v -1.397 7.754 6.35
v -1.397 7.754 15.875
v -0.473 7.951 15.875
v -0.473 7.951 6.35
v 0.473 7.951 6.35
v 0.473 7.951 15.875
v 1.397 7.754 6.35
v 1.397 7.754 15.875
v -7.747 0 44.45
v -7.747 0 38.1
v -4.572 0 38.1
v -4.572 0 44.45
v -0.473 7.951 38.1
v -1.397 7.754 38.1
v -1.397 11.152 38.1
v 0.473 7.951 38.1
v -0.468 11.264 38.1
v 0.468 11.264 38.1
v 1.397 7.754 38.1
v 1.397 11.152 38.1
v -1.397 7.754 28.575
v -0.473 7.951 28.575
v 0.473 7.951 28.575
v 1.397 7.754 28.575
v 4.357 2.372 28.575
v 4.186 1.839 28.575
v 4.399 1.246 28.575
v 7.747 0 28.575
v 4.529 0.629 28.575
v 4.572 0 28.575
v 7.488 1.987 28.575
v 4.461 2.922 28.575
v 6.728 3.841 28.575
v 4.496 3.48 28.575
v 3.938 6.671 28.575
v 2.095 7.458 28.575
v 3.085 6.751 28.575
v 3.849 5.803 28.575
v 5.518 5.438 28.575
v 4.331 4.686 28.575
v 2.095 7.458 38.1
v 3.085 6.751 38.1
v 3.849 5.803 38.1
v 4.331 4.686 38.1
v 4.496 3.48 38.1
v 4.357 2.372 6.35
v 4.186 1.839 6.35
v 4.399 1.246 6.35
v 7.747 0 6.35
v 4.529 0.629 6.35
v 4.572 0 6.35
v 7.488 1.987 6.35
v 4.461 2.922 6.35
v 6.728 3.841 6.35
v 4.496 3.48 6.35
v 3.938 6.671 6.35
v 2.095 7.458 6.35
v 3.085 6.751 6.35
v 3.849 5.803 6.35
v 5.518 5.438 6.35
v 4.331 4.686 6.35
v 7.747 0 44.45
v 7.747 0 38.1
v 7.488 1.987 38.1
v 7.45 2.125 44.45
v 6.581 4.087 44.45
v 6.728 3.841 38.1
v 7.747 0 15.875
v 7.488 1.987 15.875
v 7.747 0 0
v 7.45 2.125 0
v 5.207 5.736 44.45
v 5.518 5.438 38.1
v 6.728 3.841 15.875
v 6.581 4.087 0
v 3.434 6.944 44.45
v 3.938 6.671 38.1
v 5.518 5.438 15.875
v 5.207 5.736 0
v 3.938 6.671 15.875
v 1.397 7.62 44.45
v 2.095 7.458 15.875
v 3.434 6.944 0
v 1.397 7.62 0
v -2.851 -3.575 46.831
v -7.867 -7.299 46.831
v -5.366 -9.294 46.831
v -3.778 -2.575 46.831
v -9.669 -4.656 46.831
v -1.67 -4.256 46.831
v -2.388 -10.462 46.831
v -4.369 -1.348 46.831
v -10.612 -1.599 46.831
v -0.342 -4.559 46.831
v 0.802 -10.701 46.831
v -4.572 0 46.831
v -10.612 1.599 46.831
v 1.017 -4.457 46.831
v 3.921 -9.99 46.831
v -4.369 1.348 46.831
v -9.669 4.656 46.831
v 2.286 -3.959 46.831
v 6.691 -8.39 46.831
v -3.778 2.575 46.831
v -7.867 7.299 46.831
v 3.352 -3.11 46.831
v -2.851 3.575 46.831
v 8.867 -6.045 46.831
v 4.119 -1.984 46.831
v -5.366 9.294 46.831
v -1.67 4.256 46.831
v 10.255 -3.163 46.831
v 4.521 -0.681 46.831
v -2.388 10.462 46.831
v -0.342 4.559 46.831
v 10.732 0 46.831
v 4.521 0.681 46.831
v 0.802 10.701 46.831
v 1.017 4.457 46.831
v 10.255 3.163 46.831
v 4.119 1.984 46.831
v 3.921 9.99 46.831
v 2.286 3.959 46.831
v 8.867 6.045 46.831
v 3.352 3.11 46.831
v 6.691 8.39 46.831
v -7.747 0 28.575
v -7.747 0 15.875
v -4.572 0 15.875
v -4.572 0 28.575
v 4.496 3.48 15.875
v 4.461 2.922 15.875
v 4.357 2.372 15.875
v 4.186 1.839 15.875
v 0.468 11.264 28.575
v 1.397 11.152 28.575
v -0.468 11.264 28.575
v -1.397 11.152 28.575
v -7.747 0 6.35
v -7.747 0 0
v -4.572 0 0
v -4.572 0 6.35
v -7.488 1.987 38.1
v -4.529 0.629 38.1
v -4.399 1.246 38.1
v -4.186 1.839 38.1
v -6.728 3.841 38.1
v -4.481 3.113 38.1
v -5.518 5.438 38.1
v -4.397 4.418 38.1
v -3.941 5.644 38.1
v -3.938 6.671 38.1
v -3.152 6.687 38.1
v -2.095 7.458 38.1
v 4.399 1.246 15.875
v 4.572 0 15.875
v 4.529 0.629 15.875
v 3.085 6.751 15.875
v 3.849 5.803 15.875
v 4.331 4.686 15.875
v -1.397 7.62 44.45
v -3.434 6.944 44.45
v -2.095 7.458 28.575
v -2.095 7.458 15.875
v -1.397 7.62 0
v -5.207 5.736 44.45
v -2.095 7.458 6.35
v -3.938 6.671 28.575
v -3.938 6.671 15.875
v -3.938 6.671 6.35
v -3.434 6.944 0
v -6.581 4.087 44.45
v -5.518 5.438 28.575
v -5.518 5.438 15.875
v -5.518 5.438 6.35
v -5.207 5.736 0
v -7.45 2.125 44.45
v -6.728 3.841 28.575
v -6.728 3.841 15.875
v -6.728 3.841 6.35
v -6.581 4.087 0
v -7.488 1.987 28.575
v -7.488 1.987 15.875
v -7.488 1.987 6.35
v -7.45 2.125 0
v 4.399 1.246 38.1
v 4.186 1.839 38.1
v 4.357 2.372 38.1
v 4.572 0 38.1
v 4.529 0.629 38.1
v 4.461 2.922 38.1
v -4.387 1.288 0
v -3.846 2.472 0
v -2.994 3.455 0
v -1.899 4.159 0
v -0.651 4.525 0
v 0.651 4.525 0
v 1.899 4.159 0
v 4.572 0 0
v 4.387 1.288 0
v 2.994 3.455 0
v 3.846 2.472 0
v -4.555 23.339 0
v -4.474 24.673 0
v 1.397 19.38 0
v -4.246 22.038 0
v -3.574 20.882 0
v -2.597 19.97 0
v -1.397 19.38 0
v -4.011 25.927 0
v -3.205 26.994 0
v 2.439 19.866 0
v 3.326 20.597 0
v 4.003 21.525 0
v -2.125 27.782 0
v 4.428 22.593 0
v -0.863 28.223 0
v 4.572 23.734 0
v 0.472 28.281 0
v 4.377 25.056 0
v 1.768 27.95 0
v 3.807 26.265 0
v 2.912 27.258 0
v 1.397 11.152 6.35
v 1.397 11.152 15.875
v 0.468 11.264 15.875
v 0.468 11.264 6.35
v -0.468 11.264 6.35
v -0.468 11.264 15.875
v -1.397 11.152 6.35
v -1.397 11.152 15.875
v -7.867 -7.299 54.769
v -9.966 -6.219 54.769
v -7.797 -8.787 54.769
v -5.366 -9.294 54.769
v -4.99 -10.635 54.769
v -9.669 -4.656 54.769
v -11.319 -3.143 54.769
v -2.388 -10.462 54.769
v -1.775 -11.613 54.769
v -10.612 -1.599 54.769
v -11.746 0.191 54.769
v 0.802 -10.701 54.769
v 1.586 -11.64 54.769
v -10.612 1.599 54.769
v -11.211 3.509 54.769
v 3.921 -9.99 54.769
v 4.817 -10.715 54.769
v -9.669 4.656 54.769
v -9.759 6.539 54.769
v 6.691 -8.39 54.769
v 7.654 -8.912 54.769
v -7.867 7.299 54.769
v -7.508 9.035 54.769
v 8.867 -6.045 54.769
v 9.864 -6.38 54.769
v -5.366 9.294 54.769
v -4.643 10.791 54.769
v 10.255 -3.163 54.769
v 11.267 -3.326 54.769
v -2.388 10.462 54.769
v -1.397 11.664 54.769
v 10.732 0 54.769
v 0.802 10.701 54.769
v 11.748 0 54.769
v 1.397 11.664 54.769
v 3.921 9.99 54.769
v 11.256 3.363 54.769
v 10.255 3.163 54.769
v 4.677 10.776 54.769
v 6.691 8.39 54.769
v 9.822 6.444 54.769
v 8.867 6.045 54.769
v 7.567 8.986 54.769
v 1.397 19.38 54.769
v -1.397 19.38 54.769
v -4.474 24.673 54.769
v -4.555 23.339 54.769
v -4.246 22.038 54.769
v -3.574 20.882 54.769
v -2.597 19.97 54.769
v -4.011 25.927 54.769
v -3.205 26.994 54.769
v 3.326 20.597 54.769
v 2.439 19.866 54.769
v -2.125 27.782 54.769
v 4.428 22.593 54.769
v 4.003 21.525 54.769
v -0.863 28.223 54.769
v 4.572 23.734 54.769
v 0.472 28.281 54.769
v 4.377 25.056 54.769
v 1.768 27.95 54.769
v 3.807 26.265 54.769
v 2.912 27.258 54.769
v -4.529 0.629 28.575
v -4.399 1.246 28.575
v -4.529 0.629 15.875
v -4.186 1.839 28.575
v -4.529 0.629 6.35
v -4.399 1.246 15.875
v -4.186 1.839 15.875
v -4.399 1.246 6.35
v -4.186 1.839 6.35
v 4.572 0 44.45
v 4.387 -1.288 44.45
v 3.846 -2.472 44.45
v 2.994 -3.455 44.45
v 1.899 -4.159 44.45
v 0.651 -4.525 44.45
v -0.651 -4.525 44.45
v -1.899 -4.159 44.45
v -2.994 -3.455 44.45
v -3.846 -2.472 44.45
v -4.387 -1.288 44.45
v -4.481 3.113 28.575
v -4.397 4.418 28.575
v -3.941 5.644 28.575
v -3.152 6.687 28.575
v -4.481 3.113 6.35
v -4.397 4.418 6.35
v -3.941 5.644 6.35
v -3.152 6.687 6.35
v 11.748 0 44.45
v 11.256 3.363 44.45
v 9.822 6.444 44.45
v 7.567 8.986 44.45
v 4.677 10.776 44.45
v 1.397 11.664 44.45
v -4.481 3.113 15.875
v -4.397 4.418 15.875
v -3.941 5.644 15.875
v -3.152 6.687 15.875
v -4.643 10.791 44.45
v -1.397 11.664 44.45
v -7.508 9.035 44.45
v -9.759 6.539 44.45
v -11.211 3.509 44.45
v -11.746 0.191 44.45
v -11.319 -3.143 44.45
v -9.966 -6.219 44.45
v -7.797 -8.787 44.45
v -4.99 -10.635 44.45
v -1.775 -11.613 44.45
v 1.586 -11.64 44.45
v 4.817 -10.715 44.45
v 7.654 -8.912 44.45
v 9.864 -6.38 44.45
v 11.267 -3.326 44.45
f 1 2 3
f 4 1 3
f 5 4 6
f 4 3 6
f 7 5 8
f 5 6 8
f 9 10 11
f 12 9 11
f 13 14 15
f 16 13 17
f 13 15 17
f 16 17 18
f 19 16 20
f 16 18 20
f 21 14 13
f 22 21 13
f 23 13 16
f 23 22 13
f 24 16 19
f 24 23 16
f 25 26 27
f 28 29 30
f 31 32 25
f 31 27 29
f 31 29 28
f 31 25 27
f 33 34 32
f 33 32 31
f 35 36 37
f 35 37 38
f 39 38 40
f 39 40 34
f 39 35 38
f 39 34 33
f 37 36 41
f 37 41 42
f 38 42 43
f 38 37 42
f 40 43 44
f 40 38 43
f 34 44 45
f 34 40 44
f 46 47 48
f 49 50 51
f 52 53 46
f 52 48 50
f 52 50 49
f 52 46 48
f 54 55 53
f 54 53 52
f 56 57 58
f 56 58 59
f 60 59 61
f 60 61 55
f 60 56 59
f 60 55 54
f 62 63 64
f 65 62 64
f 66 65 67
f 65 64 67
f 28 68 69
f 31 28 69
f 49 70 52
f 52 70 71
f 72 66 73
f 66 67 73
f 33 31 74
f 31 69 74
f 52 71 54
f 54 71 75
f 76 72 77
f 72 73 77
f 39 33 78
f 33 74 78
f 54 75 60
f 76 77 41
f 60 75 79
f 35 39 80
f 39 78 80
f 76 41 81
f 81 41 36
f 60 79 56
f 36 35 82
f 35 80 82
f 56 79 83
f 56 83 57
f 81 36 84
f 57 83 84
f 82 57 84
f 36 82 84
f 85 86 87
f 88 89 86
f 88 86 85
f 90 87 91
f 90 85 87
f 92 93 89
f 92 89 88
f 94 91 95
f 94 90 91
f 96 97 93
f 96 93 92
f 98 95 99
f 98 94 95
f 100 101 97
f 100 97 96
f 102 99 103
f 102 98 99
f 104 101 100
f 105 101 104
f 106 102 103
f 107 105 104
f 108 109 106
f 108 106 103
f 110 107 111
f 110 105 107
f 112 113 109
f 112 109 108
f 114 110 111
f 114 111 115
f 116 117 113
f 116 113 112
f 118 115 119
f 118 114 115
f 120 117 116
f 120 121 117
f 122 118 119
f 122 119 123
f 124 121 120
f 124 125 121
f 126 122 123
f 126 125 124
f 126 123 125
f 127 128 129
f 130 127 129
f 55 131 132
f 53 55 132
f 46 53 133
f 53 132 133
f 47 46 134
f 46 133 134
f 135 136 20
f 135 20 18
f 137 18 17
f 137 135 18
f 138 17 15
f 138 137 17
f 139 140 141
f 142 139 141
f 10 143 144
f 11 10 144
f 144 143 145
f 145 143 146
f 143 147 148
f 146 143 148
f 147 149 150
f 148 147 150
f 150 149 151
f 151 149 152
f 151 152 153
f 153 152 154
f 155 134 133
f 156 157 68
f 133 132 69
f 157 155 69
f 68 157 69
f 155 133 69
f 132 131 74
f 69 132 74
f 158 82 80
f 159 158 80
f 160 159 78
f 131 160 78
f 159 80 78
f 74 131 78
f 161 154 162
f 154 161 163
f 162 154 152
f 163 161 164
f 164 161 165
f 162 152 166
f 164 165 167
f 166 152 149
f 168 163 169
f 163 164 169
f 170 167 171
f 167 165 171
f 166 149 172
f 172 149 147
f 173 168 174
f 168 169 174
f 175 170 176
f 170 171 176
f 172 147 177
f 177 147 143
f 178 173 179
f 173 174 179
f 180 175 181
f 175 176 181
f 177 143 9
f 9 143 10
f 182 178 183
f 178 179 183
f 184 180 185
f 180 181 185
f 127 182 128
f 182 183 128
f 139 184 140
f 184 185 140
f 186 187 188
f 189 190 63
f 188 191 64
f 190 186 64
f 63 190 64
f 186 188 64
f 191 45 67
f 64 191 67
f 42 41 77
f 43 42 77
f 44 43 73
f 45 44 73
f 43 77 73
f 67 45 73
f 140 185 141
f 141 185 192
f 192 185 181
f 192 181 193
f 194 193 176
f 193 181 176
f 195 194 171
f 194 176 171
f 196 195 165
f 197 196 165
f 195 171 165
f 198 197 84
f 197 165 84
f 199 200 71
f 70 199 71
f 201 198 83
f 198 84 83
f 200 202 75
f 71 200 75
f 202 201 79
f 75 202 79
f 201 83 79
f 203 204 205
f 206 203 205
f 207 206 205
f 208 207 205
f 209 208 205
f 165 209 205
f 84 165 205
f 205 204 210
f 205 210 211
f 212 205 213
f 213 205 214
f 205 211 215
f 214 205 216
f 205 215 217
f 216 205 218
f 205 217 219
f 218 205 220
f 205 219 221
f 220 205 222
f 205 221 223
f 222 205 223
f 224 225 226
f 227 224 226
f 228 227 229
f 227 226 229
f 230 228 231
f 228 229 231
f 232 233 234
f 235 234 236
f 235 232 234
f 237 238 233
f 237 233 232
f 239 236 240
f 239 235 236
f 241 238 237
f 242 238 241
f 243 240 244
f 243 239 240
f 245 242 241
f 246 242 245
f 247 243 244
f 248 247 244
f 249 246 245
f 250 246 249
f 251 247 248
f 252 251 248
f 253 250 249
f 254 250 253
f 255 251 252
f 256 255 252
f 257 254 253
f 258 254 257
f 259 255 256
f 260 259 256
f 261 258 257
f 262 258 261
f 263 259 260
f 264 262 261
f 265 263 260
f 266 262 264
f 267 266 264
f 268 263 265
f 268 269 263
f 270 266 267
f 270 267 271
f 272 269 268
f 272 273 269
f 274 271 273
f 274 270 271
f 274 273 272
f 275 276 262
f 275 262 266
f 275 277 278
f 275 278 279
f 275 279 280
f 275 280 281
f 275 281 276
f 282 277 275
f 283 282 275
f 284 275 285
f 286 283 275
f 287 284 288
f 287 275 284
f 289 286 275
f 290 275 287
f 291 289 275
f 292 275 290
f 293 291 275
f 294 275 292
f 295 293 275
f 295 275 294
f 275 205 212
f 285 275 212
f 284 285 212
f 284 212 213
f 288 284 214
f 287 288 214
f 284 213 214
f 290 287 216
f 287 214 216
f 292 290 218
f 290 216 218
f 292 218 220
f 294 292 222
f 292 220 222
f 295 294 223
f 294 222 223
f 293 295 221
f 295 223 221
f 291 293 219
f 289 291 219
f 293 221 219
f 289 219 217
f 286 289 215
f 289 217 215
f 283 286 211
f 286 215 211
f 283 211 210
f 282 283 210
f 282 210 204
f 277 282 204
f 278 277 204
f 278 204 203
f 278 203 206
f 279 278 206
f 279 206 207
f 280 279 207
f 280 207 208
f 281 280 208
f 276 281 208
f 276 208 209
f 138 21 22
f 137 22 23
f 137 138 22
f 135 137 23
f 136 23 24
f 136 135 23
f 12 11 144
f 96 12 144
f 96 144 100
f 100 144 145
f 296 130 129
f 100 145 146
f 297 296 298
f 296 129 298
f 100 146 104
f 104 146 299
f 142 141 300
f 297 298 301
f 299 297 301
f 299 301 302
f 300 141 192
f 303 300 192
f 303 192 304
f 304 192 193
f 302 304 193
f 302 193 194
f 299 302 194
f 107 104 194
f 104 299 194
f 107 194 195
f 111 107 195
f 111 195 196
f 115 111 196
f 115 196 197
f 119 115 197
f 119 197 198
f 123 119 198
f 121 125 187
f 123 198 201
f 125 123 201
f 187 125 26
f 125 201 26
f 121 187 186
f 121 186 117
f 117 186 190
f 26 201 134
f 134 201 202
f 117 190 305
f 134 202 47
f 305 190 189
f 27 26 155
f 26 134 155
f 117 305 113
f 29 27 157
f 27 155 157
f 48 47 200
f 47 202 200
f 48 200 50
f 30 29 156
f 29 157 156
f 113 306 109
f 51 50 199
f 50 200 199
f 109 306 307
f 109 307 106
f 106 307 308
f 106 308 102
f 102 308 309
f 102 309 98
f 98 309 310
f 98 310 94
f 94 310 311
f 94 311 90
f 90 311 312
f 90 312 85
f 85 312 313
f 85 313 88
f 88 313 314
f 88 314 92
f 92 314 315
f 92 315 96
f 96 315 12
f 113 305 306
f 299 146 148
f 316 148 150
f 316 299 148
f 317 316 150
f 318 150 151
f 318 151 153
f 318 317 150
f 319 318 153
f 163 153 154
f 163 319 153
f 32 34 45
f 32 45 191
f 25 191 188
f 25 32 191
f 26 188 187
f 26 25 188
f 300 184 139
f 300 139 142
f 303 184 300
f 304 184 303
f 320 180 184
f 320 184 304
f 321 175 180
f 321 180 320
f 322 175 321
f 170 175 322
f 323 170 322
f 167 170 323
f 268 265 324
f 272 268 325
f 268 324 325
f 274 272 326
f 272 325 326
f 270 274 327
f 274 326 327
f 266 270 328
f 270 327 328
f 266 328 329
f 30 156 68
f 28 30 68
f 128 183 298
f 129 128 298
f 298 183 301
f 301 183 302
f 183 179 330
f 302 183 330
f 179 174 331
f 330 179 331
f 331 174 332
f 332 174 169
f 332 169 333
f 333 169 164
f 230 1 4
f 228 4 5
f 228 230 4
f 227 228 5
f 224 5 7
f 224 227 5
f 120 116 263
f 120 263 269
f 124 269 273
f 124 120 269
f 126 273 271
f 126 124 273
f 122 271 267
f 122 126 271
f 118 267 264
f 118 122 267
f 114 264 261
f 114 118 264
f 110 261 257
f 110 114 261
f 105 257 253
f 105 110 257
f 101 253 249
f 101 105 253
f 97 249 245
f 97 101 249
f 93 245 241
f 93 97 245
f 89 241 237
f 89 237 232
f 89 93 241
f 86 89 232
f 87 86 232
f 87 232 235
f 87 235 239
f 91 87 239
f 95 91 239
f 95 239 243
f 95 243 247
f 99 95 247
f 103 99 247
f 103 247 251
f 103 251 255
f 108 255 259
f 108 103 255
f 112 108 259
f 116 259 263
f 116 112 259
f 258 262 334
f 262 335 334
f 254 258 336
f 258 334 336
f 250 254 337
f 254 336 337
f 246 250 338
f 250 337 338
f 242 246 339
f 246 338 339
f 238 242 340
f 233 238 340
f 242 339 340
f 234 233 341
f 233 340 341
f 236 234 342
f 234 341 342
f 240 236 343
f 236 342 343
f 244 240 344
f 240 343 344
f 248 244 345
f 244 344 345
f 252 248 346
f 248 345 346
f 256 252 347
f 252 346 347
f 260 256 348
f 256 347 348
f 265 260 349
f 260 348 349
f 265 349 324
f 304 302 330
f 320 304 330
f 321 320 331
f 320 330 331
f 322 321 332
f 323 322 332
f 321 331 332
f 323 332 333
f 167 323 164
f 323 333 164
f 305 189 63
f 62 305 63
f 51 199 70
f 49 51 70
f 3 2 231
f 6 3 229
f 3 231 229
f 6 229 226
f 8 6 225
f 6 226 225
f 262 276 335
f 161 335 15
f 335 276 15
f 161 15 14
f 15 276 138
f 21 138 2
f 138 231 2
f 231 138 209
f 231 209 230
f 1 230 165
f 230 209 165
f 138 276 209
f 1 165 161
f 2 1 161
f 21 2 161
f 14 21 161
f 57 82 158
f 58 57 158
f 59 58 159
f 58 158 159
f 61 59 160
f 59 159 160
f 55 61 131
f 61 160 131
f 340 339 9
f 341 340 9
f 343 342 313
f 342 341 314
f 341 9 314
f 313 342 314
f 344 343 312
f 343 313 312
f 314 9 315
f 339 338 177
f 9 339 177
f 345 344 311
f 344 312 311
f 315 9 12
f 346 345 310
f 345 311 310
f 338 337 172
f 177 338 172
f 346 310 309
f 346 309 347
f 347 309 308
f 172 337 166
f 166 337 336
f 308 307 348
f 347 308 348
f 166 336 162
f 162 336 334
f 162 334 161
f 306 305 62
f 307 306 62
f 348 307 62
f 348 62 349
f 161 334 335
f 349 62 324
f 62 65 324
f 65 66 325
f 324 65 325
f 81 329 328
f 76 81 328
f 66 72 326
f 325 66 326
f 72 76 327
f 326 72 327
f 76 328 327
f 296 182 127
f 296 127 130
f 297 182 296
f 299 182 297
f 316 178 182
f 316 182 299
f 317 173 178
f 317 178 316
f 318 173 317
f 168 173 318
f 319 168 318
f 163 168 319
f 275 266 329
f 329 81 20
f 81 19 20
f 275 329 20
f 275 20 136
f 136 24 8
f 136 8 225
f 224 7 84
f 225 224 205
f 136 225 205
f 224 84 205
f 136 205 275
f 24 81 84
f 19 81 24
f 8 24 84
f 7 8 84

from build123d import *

# Parameters (mm, degrees)
F1_DEPTH  = 44.45
F9_DEPTH  = 9.525
F10_DEPTH = 9.525
F12_DEPTH = 2.38125
F13_R     = 11.7475
F13_R_2   = 10.7315
F14_DEPTH = 7.9375
F15_DEPTH = 10.31875


with BuildPart() as f1:
    # F0 (on Top) → F1 (new body)
    with BuildSketch(Plane.XY):
        with BuildLine():
            ThreePointArc((-4.572, 0), (0, 4.572), (4.572, 0))
            Line((4.572, 0), (7.747, 0))
            ThreePointArc((7.747, 0), (5.951410253, 4.9595085442), (1.397, 7.62))
            ThreePointArc((1.397, 7.62), (0, 7.747), (-1.397, 7.62))
            ThreePointArc((-1.397, 7.62), (-5.951410253, 4.9595085442), (-7.747, 0))
            Line((-7.747, 0), (-4.572, 0))
        make_face()
        with BuildLine():
            ThreePointArc((-1.397, 7.62), (0, 7.747), (1.397, 7.62))
            Line((1.397, 7.62), (1.397, 19.3802))
            ThreePointArc((1.397, 19.3802), (0, 19.1615406713), (-1.397, 19.3802))
            Line((-1.397, 19.3802), (-1.397, 7.62))
        make_face()
        with BuildLine():
            ThreePointArc((-1.397, 19.3802), (0, 19.1615406713), (1.397, 19.3802))
            ThreePointArc((1.397, 19.3802), (3.6939320514, 21.0394638349), (4.572, 23.7335406713))
            ThreePointArc((4.572, 23.7335406713), (-2.6940768363, 27.4274727226), (-1.397, 19.3802))
        make_face()
    extrude(amount=F1_DEPTH)

    # F6 (on offset) → F9 (cut)
    with BuildSketch(Plane.XY.offset(28.575)):
        with BuildLine():
            ThreePointArc((4.1557772601, 1.7640375299), (0, -1.016), (-4.1557772601, 1.7640375299))
            Line((-4.1557772601, 1.7640375299), (-7.6070004234, 1.7640375299))
            ThreePointArc((-7.6070004234, 1.7640375299), (0, -4.318), (7.6070004234, 1.7640375299))
            Line((7.6070004234, 1.7640375299), (4.1557772601, 1.7640375299))
        make_face()
        with BuildLine():
            ThreePointArc((-4.1557772601, 1.7640375299), (-0.8747878771, 7.8904367738), (4.4961791045, 3.4801791045))
            ThreePointArc((4.4961791045, 3.4801791045), (4.4102576693, 2.6053912274), (4.1557772601, 1.7640375299))
            Line((4.1557772601, 1.7640375299), (7.6070004234, 1.7640375299))
            ThreePointArc((7.6070004234, 1.7640375299), (7.750237064, 2.6168003938), (7.7981791045, 3.4801791045))
            ThreePointArc((7.7981791045, 3.4801791045), (-0.8633787106, 11.2304161684), (-7.6070004234, 1.7640375299))
            Line((-7.6070004234, 1.7640375299), (-4.1557772601, 1.7640375299))
        make_face()
        with BuildLine():
            ThreePointArc((7.6070004234, 1.7640375299), (0, -4.318), (-7.6070004234, 1.7640375299))
            Line((-7.6070004234, 1.7640375299), (-8.4216929972, 1.7640375299))
            Line((-8.4216929972, 1.7640375299), (-8.4216929972, -6.3198274001))
            Line((-8.4216929972, -6.3198274001), (11.7628639564, -6.3198274001))
            Line((11.7628639564, -6.3198274001), (11.7628639564, 1.7640375299))
            Line((11.7628639564, 1.7640375299), (7.6070004234, 1.7640375299))
        make_face()
    extrude(amount=F9_DEPTH, mode=Mode.SUBTRACT)

    # F8 (on offset) → F10 (cut)
    with BuildSketch(Plane.XY.offset(15.875)):
        with BuildLine():
            ThreePointArc((4.179462045, 1.8225532258), (0, -1.016), (-4.179462045, 1.8225532258))
            Line((-4.179462045, 1.8225532258), (-7.6199654718, 1.8225532258))
            ThreePointArc((-7.6199654718, 1.8225532258), (0, -4.318), (7.6199654718, 1.8225532258))
            Line((7.6199654718, 1.8225532258), (4.179462045, 1.8225532258))
        make_face()
        with BuildLine():
            ThreePointArc((-4.179462045, 1.8225532258), (-0.8438058499, 7.8964692022), (4.4961791045, 3.4801791045))
            ThreePointArc((4.4961791045, 3.4801791045), (4.4162900977, 2.6363732546), (4.179462045, 1.8225532258))
            Line((4.179462045, 1.8225532258), (7.6199654718, 1.8225532258))
            ThreePointArc((7.6199654718, 1.8225532258), (7.7534976902, 2.6465899292), (7.7981791045, 3.4801791045))
            ThreePointArc((7.7981791045, 3.4801791045), (-0.8335891753, 11.2336767947), (-7.6199654718, 1.8225532258))
            Line((-7.6199654718, 1.8225532258), (-4.179462045, 1.8225532258))
        make_face()
        with BuildLine():
            ThreePointArc((7.6199654718, 1.8225532258), (0, -4.318), (-7.6199654718, 1.8225532258))
            Line((-7.6199654718, 1.8225532258), (-8.5849482566, 1.8225532258))
            Line((-8.5849482566, 1.8225532258), (-8.5849482566, -5.9901881032))
            Line((-8.5849482566, -5.9901881032), (8.4006469697, -5.9901881032))
            Line((8.4006469697, -5.9901881032), (8.4006469697, 1.8225532258))
            Line((8.4006469697, 1.8225532258), (7.6199654718, 1.8225532258))
        make_face()
    extrude(amount=-F10_DEPTH, mode=Mode.SUBTRACT)

    # F11 (on face) → F12 (join)
    with BuildSketch(Plane.XY.offset(44.45)):
        with BuildLine():
            ThreePointArc((-1.397, 11.6641393703), (-7.7971949684, -8.7867802337), (11.7475, 0))
            ThreePointArc((11.7475, 0), (8.7867802337, 7.7971949684), (1.397, 11.6641393703))
            Line((1.397, 11.6641393703), (1.397, 7.62))
            ThreePointArc((1.397, 7.62), (5.951410253, 4.9595085442), (7.747, 0))
            Line((7.747, 0), (4.572, 0))
            ThreePointArc((4.572, 0), (0, -4.572), (-4.572, 0))
            Line((-4.572, 0), (-7.747, 0))
            ThreePointArc((-7.747, 0), (-5.951410253, 4.9595085442), (-1.397, 7.62))
            Line((-1.397, 7.62), (-1.397, 11.6641393703))
        make_face()
        with BuildLine():
            Line((1.397, 7.62), (1.397, 11.6641393703))
            ThreePointArc((1.397, 11.6641393703), (0, 11.7475), (-1.397, 11.6641393703))
            Line((-1.397, 11.6641393703), (-1.397, 7.62))
            ThreePointArc((-1.397, 7.62), (-5.951410253, 4.9595085442), (-7.747, 0))
            Line((-7.747, 0), (-4.572, 0))
            ThreePointArc((-4.572, 0), (0, 4.572), (4.572, 0))
            Line((4.572, 0), (7.747, 0))
            ThreePointArc((7.747, 0), (5.951410253, 4.9595085442), (1.397, 7.62))
        make_face()
    extrude(amount=F12_DEPTH)

    # F13 (on face) → F14 (join)
    with BuildSketch(Plane.XY.offset(46.83125)):
        Circle(F13_R)
        Circle(F13_R_2, mode=Mode.SUBTRACT)
    extrude(amount=F14_DEPTH)

    # F15 (add, through all): a face of the model
    f15_faces = [f1.faces().sort_by_distance(p)[0] for p in [
        (0, 21.7334038121, 44.45),
    ]]
    extrude(f15_faces, amount=F15_DEPTH)


solid = f1.part
